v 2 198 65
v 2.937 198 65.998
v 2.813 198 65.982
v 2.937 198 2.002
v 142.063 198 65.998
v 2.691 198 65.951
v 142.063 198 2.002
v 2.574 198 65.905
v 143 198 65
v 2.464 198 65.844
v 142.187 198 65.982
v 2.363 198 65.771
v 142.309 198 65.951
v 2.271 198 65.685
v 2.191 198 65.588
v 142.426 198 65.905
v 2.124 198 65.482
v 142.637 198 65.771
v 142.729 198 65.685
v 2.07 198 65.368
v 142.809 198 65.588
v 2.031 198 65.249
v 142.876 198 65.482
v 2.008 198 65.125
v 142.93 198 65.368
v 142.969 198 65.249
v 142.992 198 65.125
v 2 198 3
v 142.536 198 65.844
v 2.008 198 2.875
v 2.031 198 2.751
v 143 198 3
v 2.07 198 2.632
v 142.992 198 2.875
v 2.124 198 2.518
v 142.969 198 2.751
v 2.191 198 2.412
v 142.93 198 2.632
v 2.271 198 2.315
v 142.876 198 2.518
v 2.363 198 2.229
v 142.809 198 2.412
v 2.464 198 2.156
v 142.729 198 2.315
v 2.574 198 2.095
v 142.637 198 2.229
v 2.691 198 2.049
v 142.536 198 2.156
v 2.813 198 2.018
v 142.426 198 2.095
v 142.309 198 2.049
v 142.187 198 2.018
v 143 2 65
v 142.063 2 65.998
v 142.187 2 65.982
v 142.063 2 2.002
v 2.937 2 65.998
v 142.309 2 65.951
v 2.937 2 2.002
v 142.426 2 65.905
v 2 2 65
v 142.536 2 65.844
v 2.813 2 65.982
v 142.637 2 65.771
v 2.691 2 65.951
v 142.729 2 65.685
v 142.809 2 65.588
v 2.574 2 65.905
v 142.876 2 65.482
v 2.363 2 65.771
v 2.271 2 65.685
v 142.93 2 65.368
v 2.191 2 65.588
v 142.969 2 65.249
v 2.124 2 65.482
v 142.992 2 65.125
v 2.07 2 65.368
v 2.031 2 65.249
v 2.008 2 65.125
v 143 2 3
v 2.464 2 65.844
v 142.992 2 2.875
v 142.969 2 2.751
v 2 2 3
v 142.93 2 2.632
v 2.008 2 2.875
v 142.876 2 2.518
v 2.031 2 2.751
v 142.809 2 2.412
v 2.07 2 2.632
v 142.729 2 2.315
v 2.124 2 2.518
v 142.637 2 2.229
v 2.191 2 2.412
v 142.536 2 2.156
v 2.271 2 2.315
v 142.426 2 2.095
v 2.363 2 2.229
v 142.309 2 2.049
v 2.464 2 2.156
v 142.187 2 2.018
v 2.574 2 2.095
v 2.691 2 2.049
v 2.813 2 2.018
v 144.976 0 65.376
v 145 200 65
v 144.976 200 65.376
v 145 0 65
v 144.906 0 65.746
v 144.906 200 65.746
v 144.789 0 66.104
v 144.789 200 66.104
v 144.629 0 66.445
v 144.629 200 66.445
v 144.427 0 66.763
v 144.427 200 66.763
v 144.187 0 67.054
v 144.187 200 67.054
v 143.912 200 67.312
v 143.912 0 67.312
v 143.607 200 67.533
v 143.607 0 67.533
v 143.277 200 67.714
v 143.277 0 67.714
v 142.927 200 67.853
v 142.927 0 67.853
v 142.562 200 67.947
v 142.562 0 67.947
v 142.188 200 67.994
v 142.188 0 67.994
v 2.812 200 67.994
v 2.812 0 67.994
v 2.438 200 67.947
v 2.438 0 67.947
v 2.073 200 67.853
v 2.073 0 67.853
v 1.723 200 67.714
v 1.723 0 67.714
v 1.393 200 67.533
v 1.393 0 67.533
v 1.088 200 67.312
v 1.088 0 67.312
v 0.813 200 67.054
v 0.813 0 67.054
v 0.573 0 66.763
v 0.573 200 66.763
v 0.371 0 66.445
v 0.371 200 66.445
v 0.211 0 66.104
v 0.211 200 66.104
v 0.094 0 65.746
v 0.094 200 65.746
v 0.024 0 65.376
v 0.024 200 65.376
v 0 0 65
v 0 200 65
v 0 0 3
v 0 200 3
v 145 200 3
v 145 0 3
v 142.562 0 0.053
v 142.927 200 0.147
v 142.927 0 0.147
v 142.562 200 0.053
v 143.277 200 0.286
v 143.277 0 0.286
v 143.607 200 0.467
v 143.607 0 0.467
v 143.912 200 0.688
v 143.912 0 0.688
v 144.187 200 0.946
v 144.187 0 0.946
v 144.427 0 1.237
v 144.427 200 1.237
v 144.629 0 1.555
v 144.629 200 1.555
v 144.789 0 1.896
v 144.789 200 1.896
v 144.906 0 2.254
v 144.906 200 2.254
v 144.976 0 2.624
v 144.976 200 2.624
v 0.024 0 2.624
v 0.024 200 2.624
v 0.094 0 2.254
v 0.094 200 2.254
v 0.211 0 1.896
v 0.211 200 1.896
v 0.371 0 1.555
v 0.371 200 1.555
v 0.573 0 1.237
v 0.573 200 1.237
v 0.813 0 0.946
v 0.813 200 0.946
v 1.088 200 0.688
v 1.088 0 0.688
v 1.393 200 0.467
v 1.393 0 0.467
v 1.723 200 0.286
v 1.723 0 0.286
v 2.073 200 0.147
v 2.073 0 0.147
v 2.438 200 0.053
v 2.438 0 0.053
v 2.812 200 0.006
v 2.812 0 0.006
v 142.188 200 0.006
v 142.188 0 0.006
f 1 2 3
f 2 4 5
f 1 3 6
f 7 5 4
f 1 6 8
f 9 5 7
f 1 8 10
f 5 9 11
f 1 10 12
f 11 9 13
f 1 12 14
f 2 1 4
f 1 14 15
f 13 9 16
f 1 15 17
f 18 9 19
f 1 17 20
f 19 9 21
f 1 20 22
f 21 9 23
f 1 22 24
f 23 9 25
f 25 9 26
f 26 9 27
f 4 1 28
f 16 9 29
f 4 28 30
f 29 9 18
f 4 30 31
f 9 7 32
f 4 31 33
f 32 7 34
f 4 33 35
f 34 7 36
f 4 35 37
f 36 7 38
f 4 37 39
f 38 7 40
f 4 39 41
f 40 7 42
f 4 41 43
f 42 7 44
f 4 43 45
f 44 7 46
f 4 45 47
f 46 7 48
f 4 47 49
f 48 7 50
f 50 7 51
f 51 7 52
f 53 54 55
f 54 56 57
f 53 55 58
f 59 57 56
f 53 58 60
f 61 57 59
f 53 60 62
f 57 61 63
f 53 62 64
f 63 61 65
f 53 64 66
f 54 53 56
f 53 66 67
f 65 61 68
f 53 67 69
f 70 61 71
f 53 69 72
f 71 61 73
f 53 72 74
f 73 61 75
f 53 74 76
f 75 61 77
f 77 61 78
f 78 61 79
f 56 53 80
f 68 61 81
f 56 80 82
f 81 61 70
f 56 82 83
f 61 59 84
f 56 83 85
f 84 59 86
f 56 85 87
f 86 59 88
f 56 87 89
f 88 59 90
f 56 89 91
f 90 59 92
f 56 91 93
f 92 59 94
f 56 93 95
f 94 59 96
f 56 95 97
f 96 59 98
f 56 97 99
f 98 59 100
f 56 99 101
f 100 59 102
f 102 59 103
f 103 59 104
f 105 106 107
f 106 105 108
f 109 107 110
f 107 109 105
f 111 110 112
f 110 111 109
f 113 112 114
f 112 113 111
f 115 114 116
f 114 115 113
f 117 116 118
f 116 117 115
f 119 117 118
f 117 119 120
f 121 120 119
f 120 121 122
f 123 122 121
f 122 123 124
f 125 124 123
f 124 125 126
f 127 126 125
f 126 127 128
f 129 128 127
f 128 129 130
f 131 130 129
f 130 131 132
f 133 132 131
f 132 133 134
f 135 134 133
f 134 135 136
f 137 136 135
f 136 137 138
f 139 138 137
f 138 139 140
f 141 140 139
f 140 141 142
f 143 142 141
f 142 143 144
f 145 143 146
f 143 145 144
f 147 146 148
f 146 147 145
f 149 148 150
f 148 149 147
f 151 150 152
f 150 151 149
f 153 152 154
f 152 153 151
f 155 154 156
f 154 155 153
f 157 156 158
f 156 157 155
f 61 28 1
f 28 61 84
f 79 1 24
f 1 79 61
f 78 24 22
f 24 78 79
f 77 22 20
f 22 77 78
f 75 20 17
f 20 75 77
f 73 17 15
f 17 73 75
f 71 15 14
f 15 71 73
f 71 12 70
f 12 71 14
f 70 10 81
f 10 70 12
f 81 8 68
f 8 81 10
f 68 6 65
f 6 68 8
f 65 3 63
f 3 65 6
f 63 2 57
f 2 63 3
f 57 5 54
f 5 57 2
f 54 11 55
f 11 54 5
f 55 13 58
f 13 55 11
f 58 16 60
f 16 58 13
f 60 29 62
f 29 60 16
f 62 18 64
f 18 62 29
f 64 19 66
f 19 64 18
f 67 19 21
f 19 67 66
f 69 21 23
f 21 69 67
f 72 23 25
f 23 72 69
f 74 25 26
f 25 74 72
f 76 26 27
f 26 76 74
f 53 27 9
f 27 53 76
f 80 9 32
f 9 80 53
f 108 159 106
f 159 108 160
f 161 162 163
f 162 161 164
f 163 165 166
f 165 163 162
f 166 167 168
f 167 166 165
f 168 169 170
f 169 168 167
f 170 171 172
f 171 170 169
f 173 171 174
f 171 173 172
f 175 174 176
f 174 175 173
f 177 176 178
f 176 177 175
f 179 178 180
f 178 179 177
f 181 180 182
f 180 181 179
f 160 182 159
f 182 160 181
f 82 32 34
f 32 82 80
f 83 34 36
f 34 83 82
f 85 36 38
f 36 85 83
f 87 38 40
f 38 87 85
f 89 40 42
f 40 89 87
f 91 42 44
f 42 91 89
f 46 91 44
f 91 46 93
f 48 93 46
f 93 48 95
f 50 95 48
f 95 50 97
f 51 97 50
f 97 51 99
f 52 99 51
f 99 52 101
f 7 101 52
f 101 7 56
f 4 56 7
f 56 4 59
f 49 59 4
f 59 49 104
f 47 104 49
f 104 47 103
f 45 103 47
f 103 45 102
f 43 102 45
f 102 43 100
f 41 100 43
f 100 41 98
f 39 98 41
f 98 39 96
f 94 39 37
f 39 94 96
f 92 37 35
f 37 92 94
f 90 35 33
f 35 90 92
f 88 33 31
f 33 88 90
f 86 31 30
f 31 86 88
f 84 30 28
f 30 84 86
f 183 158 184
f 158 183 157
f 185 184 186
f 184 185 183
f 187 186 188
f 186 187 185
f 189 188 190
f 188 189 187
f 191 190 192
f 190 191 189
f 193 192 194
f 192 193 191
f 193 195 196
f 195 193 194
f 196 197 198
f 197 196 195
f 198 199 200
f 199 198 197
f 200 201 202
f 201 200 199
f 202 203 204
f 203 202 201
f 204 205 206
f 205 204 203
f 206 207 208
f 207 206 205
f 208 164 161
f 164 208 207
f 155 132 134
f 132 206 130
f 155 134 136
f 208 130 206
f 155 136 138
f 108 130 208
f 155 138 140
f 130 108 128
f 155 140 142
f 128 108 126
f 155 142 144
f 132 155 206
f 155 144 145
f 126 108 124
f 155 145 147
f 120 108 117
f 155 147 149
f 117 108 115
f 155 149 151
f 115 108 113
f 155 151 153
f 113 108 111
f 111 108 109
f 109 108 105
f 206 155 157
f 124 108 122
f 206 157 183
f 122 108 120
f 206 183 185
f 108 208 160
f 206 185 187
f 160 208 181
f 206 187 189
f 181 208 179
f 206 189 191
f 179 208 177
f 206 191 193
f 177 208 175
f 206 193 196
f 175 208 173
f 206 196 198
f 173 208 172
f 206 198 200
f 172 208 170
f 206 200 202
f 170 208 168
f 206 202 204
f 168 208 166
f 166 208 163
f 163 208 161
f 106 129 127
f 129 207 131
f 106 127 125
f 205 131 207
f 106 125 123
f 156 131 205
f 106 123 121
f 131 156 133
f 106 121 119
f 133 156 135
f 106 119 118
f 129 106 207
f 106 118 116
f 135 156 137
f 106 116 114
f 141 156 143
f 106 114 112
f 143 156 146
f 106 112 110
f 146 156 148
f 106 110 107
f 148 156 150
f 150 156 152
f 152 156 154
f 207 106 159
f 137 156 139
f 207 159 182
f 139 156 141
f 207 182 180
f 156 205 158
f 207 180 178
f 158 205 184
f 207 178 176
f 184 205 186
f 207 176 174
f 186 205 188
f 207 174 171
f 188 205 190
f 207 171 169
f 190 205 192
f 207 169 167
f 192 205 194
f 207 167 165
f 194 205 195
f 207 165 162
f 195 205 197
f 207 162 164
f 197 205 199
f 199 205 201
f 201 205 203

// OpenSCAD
$fn=50;


showTop=true;

 extrusionCase();
 module extrusionCase(size=[145,200,68],sheetThck=2, rad=3, split=0.4, center=false){
   //case made of Aluminum Extrusions
   cntrOffset= center ? [0,0,0] : size/2;
   
   //looking for global "show" variables
   showTop=     is_undef(showTop)     ? true : showTop;
   showBottom=  is_undef(showBottom)  ? true : showBottom;
   showFront=   is_undef(showFront)   ? true : showFront;
   showBack=    is_undef(showBack)    ? true : showBack;
   
   translate(cntrOffset) rotate([90,0,0]){
     //Top
     if (showTop) linear_extrude(size.y-sheetThck*2,center=true) difference(){
       shape();
       translate([0,-size.z/2*(1-split)]) square([size.y,size.z*split],true);
     }
     //Bottom
     if (showBottom) linear_extrude(size.y-sheetThck*2,center=true) difference(){
       shape();
       translate([0,size.z/2*split]) square([size.x,size.z*(1-split)],true);
     }
     if (showFront) translate([0,0,size.y/2-sheetThck]) linear_extrude(sheetThck) shape(false);
     if (showBack) translate([0,0,-(size.y/2)]) linear_extrude(sheetThck) shape(false);
   }
   
  module shape(hollow=true){
    difference(){
    hull() for (ix=[-1,1],iy=[-1,1])
      translate([ix*(size.x/2-rad),iy*(size.z/2-rad)]) circle(rad);
    if (hollow) hull() for (ix=[-1,1],iy=[-1,1])
      translate([ix*(size.x/2-rad),iy*(size.z/2-rad)]) circle(rad-sheetThck);
  }
  }
 }
 
